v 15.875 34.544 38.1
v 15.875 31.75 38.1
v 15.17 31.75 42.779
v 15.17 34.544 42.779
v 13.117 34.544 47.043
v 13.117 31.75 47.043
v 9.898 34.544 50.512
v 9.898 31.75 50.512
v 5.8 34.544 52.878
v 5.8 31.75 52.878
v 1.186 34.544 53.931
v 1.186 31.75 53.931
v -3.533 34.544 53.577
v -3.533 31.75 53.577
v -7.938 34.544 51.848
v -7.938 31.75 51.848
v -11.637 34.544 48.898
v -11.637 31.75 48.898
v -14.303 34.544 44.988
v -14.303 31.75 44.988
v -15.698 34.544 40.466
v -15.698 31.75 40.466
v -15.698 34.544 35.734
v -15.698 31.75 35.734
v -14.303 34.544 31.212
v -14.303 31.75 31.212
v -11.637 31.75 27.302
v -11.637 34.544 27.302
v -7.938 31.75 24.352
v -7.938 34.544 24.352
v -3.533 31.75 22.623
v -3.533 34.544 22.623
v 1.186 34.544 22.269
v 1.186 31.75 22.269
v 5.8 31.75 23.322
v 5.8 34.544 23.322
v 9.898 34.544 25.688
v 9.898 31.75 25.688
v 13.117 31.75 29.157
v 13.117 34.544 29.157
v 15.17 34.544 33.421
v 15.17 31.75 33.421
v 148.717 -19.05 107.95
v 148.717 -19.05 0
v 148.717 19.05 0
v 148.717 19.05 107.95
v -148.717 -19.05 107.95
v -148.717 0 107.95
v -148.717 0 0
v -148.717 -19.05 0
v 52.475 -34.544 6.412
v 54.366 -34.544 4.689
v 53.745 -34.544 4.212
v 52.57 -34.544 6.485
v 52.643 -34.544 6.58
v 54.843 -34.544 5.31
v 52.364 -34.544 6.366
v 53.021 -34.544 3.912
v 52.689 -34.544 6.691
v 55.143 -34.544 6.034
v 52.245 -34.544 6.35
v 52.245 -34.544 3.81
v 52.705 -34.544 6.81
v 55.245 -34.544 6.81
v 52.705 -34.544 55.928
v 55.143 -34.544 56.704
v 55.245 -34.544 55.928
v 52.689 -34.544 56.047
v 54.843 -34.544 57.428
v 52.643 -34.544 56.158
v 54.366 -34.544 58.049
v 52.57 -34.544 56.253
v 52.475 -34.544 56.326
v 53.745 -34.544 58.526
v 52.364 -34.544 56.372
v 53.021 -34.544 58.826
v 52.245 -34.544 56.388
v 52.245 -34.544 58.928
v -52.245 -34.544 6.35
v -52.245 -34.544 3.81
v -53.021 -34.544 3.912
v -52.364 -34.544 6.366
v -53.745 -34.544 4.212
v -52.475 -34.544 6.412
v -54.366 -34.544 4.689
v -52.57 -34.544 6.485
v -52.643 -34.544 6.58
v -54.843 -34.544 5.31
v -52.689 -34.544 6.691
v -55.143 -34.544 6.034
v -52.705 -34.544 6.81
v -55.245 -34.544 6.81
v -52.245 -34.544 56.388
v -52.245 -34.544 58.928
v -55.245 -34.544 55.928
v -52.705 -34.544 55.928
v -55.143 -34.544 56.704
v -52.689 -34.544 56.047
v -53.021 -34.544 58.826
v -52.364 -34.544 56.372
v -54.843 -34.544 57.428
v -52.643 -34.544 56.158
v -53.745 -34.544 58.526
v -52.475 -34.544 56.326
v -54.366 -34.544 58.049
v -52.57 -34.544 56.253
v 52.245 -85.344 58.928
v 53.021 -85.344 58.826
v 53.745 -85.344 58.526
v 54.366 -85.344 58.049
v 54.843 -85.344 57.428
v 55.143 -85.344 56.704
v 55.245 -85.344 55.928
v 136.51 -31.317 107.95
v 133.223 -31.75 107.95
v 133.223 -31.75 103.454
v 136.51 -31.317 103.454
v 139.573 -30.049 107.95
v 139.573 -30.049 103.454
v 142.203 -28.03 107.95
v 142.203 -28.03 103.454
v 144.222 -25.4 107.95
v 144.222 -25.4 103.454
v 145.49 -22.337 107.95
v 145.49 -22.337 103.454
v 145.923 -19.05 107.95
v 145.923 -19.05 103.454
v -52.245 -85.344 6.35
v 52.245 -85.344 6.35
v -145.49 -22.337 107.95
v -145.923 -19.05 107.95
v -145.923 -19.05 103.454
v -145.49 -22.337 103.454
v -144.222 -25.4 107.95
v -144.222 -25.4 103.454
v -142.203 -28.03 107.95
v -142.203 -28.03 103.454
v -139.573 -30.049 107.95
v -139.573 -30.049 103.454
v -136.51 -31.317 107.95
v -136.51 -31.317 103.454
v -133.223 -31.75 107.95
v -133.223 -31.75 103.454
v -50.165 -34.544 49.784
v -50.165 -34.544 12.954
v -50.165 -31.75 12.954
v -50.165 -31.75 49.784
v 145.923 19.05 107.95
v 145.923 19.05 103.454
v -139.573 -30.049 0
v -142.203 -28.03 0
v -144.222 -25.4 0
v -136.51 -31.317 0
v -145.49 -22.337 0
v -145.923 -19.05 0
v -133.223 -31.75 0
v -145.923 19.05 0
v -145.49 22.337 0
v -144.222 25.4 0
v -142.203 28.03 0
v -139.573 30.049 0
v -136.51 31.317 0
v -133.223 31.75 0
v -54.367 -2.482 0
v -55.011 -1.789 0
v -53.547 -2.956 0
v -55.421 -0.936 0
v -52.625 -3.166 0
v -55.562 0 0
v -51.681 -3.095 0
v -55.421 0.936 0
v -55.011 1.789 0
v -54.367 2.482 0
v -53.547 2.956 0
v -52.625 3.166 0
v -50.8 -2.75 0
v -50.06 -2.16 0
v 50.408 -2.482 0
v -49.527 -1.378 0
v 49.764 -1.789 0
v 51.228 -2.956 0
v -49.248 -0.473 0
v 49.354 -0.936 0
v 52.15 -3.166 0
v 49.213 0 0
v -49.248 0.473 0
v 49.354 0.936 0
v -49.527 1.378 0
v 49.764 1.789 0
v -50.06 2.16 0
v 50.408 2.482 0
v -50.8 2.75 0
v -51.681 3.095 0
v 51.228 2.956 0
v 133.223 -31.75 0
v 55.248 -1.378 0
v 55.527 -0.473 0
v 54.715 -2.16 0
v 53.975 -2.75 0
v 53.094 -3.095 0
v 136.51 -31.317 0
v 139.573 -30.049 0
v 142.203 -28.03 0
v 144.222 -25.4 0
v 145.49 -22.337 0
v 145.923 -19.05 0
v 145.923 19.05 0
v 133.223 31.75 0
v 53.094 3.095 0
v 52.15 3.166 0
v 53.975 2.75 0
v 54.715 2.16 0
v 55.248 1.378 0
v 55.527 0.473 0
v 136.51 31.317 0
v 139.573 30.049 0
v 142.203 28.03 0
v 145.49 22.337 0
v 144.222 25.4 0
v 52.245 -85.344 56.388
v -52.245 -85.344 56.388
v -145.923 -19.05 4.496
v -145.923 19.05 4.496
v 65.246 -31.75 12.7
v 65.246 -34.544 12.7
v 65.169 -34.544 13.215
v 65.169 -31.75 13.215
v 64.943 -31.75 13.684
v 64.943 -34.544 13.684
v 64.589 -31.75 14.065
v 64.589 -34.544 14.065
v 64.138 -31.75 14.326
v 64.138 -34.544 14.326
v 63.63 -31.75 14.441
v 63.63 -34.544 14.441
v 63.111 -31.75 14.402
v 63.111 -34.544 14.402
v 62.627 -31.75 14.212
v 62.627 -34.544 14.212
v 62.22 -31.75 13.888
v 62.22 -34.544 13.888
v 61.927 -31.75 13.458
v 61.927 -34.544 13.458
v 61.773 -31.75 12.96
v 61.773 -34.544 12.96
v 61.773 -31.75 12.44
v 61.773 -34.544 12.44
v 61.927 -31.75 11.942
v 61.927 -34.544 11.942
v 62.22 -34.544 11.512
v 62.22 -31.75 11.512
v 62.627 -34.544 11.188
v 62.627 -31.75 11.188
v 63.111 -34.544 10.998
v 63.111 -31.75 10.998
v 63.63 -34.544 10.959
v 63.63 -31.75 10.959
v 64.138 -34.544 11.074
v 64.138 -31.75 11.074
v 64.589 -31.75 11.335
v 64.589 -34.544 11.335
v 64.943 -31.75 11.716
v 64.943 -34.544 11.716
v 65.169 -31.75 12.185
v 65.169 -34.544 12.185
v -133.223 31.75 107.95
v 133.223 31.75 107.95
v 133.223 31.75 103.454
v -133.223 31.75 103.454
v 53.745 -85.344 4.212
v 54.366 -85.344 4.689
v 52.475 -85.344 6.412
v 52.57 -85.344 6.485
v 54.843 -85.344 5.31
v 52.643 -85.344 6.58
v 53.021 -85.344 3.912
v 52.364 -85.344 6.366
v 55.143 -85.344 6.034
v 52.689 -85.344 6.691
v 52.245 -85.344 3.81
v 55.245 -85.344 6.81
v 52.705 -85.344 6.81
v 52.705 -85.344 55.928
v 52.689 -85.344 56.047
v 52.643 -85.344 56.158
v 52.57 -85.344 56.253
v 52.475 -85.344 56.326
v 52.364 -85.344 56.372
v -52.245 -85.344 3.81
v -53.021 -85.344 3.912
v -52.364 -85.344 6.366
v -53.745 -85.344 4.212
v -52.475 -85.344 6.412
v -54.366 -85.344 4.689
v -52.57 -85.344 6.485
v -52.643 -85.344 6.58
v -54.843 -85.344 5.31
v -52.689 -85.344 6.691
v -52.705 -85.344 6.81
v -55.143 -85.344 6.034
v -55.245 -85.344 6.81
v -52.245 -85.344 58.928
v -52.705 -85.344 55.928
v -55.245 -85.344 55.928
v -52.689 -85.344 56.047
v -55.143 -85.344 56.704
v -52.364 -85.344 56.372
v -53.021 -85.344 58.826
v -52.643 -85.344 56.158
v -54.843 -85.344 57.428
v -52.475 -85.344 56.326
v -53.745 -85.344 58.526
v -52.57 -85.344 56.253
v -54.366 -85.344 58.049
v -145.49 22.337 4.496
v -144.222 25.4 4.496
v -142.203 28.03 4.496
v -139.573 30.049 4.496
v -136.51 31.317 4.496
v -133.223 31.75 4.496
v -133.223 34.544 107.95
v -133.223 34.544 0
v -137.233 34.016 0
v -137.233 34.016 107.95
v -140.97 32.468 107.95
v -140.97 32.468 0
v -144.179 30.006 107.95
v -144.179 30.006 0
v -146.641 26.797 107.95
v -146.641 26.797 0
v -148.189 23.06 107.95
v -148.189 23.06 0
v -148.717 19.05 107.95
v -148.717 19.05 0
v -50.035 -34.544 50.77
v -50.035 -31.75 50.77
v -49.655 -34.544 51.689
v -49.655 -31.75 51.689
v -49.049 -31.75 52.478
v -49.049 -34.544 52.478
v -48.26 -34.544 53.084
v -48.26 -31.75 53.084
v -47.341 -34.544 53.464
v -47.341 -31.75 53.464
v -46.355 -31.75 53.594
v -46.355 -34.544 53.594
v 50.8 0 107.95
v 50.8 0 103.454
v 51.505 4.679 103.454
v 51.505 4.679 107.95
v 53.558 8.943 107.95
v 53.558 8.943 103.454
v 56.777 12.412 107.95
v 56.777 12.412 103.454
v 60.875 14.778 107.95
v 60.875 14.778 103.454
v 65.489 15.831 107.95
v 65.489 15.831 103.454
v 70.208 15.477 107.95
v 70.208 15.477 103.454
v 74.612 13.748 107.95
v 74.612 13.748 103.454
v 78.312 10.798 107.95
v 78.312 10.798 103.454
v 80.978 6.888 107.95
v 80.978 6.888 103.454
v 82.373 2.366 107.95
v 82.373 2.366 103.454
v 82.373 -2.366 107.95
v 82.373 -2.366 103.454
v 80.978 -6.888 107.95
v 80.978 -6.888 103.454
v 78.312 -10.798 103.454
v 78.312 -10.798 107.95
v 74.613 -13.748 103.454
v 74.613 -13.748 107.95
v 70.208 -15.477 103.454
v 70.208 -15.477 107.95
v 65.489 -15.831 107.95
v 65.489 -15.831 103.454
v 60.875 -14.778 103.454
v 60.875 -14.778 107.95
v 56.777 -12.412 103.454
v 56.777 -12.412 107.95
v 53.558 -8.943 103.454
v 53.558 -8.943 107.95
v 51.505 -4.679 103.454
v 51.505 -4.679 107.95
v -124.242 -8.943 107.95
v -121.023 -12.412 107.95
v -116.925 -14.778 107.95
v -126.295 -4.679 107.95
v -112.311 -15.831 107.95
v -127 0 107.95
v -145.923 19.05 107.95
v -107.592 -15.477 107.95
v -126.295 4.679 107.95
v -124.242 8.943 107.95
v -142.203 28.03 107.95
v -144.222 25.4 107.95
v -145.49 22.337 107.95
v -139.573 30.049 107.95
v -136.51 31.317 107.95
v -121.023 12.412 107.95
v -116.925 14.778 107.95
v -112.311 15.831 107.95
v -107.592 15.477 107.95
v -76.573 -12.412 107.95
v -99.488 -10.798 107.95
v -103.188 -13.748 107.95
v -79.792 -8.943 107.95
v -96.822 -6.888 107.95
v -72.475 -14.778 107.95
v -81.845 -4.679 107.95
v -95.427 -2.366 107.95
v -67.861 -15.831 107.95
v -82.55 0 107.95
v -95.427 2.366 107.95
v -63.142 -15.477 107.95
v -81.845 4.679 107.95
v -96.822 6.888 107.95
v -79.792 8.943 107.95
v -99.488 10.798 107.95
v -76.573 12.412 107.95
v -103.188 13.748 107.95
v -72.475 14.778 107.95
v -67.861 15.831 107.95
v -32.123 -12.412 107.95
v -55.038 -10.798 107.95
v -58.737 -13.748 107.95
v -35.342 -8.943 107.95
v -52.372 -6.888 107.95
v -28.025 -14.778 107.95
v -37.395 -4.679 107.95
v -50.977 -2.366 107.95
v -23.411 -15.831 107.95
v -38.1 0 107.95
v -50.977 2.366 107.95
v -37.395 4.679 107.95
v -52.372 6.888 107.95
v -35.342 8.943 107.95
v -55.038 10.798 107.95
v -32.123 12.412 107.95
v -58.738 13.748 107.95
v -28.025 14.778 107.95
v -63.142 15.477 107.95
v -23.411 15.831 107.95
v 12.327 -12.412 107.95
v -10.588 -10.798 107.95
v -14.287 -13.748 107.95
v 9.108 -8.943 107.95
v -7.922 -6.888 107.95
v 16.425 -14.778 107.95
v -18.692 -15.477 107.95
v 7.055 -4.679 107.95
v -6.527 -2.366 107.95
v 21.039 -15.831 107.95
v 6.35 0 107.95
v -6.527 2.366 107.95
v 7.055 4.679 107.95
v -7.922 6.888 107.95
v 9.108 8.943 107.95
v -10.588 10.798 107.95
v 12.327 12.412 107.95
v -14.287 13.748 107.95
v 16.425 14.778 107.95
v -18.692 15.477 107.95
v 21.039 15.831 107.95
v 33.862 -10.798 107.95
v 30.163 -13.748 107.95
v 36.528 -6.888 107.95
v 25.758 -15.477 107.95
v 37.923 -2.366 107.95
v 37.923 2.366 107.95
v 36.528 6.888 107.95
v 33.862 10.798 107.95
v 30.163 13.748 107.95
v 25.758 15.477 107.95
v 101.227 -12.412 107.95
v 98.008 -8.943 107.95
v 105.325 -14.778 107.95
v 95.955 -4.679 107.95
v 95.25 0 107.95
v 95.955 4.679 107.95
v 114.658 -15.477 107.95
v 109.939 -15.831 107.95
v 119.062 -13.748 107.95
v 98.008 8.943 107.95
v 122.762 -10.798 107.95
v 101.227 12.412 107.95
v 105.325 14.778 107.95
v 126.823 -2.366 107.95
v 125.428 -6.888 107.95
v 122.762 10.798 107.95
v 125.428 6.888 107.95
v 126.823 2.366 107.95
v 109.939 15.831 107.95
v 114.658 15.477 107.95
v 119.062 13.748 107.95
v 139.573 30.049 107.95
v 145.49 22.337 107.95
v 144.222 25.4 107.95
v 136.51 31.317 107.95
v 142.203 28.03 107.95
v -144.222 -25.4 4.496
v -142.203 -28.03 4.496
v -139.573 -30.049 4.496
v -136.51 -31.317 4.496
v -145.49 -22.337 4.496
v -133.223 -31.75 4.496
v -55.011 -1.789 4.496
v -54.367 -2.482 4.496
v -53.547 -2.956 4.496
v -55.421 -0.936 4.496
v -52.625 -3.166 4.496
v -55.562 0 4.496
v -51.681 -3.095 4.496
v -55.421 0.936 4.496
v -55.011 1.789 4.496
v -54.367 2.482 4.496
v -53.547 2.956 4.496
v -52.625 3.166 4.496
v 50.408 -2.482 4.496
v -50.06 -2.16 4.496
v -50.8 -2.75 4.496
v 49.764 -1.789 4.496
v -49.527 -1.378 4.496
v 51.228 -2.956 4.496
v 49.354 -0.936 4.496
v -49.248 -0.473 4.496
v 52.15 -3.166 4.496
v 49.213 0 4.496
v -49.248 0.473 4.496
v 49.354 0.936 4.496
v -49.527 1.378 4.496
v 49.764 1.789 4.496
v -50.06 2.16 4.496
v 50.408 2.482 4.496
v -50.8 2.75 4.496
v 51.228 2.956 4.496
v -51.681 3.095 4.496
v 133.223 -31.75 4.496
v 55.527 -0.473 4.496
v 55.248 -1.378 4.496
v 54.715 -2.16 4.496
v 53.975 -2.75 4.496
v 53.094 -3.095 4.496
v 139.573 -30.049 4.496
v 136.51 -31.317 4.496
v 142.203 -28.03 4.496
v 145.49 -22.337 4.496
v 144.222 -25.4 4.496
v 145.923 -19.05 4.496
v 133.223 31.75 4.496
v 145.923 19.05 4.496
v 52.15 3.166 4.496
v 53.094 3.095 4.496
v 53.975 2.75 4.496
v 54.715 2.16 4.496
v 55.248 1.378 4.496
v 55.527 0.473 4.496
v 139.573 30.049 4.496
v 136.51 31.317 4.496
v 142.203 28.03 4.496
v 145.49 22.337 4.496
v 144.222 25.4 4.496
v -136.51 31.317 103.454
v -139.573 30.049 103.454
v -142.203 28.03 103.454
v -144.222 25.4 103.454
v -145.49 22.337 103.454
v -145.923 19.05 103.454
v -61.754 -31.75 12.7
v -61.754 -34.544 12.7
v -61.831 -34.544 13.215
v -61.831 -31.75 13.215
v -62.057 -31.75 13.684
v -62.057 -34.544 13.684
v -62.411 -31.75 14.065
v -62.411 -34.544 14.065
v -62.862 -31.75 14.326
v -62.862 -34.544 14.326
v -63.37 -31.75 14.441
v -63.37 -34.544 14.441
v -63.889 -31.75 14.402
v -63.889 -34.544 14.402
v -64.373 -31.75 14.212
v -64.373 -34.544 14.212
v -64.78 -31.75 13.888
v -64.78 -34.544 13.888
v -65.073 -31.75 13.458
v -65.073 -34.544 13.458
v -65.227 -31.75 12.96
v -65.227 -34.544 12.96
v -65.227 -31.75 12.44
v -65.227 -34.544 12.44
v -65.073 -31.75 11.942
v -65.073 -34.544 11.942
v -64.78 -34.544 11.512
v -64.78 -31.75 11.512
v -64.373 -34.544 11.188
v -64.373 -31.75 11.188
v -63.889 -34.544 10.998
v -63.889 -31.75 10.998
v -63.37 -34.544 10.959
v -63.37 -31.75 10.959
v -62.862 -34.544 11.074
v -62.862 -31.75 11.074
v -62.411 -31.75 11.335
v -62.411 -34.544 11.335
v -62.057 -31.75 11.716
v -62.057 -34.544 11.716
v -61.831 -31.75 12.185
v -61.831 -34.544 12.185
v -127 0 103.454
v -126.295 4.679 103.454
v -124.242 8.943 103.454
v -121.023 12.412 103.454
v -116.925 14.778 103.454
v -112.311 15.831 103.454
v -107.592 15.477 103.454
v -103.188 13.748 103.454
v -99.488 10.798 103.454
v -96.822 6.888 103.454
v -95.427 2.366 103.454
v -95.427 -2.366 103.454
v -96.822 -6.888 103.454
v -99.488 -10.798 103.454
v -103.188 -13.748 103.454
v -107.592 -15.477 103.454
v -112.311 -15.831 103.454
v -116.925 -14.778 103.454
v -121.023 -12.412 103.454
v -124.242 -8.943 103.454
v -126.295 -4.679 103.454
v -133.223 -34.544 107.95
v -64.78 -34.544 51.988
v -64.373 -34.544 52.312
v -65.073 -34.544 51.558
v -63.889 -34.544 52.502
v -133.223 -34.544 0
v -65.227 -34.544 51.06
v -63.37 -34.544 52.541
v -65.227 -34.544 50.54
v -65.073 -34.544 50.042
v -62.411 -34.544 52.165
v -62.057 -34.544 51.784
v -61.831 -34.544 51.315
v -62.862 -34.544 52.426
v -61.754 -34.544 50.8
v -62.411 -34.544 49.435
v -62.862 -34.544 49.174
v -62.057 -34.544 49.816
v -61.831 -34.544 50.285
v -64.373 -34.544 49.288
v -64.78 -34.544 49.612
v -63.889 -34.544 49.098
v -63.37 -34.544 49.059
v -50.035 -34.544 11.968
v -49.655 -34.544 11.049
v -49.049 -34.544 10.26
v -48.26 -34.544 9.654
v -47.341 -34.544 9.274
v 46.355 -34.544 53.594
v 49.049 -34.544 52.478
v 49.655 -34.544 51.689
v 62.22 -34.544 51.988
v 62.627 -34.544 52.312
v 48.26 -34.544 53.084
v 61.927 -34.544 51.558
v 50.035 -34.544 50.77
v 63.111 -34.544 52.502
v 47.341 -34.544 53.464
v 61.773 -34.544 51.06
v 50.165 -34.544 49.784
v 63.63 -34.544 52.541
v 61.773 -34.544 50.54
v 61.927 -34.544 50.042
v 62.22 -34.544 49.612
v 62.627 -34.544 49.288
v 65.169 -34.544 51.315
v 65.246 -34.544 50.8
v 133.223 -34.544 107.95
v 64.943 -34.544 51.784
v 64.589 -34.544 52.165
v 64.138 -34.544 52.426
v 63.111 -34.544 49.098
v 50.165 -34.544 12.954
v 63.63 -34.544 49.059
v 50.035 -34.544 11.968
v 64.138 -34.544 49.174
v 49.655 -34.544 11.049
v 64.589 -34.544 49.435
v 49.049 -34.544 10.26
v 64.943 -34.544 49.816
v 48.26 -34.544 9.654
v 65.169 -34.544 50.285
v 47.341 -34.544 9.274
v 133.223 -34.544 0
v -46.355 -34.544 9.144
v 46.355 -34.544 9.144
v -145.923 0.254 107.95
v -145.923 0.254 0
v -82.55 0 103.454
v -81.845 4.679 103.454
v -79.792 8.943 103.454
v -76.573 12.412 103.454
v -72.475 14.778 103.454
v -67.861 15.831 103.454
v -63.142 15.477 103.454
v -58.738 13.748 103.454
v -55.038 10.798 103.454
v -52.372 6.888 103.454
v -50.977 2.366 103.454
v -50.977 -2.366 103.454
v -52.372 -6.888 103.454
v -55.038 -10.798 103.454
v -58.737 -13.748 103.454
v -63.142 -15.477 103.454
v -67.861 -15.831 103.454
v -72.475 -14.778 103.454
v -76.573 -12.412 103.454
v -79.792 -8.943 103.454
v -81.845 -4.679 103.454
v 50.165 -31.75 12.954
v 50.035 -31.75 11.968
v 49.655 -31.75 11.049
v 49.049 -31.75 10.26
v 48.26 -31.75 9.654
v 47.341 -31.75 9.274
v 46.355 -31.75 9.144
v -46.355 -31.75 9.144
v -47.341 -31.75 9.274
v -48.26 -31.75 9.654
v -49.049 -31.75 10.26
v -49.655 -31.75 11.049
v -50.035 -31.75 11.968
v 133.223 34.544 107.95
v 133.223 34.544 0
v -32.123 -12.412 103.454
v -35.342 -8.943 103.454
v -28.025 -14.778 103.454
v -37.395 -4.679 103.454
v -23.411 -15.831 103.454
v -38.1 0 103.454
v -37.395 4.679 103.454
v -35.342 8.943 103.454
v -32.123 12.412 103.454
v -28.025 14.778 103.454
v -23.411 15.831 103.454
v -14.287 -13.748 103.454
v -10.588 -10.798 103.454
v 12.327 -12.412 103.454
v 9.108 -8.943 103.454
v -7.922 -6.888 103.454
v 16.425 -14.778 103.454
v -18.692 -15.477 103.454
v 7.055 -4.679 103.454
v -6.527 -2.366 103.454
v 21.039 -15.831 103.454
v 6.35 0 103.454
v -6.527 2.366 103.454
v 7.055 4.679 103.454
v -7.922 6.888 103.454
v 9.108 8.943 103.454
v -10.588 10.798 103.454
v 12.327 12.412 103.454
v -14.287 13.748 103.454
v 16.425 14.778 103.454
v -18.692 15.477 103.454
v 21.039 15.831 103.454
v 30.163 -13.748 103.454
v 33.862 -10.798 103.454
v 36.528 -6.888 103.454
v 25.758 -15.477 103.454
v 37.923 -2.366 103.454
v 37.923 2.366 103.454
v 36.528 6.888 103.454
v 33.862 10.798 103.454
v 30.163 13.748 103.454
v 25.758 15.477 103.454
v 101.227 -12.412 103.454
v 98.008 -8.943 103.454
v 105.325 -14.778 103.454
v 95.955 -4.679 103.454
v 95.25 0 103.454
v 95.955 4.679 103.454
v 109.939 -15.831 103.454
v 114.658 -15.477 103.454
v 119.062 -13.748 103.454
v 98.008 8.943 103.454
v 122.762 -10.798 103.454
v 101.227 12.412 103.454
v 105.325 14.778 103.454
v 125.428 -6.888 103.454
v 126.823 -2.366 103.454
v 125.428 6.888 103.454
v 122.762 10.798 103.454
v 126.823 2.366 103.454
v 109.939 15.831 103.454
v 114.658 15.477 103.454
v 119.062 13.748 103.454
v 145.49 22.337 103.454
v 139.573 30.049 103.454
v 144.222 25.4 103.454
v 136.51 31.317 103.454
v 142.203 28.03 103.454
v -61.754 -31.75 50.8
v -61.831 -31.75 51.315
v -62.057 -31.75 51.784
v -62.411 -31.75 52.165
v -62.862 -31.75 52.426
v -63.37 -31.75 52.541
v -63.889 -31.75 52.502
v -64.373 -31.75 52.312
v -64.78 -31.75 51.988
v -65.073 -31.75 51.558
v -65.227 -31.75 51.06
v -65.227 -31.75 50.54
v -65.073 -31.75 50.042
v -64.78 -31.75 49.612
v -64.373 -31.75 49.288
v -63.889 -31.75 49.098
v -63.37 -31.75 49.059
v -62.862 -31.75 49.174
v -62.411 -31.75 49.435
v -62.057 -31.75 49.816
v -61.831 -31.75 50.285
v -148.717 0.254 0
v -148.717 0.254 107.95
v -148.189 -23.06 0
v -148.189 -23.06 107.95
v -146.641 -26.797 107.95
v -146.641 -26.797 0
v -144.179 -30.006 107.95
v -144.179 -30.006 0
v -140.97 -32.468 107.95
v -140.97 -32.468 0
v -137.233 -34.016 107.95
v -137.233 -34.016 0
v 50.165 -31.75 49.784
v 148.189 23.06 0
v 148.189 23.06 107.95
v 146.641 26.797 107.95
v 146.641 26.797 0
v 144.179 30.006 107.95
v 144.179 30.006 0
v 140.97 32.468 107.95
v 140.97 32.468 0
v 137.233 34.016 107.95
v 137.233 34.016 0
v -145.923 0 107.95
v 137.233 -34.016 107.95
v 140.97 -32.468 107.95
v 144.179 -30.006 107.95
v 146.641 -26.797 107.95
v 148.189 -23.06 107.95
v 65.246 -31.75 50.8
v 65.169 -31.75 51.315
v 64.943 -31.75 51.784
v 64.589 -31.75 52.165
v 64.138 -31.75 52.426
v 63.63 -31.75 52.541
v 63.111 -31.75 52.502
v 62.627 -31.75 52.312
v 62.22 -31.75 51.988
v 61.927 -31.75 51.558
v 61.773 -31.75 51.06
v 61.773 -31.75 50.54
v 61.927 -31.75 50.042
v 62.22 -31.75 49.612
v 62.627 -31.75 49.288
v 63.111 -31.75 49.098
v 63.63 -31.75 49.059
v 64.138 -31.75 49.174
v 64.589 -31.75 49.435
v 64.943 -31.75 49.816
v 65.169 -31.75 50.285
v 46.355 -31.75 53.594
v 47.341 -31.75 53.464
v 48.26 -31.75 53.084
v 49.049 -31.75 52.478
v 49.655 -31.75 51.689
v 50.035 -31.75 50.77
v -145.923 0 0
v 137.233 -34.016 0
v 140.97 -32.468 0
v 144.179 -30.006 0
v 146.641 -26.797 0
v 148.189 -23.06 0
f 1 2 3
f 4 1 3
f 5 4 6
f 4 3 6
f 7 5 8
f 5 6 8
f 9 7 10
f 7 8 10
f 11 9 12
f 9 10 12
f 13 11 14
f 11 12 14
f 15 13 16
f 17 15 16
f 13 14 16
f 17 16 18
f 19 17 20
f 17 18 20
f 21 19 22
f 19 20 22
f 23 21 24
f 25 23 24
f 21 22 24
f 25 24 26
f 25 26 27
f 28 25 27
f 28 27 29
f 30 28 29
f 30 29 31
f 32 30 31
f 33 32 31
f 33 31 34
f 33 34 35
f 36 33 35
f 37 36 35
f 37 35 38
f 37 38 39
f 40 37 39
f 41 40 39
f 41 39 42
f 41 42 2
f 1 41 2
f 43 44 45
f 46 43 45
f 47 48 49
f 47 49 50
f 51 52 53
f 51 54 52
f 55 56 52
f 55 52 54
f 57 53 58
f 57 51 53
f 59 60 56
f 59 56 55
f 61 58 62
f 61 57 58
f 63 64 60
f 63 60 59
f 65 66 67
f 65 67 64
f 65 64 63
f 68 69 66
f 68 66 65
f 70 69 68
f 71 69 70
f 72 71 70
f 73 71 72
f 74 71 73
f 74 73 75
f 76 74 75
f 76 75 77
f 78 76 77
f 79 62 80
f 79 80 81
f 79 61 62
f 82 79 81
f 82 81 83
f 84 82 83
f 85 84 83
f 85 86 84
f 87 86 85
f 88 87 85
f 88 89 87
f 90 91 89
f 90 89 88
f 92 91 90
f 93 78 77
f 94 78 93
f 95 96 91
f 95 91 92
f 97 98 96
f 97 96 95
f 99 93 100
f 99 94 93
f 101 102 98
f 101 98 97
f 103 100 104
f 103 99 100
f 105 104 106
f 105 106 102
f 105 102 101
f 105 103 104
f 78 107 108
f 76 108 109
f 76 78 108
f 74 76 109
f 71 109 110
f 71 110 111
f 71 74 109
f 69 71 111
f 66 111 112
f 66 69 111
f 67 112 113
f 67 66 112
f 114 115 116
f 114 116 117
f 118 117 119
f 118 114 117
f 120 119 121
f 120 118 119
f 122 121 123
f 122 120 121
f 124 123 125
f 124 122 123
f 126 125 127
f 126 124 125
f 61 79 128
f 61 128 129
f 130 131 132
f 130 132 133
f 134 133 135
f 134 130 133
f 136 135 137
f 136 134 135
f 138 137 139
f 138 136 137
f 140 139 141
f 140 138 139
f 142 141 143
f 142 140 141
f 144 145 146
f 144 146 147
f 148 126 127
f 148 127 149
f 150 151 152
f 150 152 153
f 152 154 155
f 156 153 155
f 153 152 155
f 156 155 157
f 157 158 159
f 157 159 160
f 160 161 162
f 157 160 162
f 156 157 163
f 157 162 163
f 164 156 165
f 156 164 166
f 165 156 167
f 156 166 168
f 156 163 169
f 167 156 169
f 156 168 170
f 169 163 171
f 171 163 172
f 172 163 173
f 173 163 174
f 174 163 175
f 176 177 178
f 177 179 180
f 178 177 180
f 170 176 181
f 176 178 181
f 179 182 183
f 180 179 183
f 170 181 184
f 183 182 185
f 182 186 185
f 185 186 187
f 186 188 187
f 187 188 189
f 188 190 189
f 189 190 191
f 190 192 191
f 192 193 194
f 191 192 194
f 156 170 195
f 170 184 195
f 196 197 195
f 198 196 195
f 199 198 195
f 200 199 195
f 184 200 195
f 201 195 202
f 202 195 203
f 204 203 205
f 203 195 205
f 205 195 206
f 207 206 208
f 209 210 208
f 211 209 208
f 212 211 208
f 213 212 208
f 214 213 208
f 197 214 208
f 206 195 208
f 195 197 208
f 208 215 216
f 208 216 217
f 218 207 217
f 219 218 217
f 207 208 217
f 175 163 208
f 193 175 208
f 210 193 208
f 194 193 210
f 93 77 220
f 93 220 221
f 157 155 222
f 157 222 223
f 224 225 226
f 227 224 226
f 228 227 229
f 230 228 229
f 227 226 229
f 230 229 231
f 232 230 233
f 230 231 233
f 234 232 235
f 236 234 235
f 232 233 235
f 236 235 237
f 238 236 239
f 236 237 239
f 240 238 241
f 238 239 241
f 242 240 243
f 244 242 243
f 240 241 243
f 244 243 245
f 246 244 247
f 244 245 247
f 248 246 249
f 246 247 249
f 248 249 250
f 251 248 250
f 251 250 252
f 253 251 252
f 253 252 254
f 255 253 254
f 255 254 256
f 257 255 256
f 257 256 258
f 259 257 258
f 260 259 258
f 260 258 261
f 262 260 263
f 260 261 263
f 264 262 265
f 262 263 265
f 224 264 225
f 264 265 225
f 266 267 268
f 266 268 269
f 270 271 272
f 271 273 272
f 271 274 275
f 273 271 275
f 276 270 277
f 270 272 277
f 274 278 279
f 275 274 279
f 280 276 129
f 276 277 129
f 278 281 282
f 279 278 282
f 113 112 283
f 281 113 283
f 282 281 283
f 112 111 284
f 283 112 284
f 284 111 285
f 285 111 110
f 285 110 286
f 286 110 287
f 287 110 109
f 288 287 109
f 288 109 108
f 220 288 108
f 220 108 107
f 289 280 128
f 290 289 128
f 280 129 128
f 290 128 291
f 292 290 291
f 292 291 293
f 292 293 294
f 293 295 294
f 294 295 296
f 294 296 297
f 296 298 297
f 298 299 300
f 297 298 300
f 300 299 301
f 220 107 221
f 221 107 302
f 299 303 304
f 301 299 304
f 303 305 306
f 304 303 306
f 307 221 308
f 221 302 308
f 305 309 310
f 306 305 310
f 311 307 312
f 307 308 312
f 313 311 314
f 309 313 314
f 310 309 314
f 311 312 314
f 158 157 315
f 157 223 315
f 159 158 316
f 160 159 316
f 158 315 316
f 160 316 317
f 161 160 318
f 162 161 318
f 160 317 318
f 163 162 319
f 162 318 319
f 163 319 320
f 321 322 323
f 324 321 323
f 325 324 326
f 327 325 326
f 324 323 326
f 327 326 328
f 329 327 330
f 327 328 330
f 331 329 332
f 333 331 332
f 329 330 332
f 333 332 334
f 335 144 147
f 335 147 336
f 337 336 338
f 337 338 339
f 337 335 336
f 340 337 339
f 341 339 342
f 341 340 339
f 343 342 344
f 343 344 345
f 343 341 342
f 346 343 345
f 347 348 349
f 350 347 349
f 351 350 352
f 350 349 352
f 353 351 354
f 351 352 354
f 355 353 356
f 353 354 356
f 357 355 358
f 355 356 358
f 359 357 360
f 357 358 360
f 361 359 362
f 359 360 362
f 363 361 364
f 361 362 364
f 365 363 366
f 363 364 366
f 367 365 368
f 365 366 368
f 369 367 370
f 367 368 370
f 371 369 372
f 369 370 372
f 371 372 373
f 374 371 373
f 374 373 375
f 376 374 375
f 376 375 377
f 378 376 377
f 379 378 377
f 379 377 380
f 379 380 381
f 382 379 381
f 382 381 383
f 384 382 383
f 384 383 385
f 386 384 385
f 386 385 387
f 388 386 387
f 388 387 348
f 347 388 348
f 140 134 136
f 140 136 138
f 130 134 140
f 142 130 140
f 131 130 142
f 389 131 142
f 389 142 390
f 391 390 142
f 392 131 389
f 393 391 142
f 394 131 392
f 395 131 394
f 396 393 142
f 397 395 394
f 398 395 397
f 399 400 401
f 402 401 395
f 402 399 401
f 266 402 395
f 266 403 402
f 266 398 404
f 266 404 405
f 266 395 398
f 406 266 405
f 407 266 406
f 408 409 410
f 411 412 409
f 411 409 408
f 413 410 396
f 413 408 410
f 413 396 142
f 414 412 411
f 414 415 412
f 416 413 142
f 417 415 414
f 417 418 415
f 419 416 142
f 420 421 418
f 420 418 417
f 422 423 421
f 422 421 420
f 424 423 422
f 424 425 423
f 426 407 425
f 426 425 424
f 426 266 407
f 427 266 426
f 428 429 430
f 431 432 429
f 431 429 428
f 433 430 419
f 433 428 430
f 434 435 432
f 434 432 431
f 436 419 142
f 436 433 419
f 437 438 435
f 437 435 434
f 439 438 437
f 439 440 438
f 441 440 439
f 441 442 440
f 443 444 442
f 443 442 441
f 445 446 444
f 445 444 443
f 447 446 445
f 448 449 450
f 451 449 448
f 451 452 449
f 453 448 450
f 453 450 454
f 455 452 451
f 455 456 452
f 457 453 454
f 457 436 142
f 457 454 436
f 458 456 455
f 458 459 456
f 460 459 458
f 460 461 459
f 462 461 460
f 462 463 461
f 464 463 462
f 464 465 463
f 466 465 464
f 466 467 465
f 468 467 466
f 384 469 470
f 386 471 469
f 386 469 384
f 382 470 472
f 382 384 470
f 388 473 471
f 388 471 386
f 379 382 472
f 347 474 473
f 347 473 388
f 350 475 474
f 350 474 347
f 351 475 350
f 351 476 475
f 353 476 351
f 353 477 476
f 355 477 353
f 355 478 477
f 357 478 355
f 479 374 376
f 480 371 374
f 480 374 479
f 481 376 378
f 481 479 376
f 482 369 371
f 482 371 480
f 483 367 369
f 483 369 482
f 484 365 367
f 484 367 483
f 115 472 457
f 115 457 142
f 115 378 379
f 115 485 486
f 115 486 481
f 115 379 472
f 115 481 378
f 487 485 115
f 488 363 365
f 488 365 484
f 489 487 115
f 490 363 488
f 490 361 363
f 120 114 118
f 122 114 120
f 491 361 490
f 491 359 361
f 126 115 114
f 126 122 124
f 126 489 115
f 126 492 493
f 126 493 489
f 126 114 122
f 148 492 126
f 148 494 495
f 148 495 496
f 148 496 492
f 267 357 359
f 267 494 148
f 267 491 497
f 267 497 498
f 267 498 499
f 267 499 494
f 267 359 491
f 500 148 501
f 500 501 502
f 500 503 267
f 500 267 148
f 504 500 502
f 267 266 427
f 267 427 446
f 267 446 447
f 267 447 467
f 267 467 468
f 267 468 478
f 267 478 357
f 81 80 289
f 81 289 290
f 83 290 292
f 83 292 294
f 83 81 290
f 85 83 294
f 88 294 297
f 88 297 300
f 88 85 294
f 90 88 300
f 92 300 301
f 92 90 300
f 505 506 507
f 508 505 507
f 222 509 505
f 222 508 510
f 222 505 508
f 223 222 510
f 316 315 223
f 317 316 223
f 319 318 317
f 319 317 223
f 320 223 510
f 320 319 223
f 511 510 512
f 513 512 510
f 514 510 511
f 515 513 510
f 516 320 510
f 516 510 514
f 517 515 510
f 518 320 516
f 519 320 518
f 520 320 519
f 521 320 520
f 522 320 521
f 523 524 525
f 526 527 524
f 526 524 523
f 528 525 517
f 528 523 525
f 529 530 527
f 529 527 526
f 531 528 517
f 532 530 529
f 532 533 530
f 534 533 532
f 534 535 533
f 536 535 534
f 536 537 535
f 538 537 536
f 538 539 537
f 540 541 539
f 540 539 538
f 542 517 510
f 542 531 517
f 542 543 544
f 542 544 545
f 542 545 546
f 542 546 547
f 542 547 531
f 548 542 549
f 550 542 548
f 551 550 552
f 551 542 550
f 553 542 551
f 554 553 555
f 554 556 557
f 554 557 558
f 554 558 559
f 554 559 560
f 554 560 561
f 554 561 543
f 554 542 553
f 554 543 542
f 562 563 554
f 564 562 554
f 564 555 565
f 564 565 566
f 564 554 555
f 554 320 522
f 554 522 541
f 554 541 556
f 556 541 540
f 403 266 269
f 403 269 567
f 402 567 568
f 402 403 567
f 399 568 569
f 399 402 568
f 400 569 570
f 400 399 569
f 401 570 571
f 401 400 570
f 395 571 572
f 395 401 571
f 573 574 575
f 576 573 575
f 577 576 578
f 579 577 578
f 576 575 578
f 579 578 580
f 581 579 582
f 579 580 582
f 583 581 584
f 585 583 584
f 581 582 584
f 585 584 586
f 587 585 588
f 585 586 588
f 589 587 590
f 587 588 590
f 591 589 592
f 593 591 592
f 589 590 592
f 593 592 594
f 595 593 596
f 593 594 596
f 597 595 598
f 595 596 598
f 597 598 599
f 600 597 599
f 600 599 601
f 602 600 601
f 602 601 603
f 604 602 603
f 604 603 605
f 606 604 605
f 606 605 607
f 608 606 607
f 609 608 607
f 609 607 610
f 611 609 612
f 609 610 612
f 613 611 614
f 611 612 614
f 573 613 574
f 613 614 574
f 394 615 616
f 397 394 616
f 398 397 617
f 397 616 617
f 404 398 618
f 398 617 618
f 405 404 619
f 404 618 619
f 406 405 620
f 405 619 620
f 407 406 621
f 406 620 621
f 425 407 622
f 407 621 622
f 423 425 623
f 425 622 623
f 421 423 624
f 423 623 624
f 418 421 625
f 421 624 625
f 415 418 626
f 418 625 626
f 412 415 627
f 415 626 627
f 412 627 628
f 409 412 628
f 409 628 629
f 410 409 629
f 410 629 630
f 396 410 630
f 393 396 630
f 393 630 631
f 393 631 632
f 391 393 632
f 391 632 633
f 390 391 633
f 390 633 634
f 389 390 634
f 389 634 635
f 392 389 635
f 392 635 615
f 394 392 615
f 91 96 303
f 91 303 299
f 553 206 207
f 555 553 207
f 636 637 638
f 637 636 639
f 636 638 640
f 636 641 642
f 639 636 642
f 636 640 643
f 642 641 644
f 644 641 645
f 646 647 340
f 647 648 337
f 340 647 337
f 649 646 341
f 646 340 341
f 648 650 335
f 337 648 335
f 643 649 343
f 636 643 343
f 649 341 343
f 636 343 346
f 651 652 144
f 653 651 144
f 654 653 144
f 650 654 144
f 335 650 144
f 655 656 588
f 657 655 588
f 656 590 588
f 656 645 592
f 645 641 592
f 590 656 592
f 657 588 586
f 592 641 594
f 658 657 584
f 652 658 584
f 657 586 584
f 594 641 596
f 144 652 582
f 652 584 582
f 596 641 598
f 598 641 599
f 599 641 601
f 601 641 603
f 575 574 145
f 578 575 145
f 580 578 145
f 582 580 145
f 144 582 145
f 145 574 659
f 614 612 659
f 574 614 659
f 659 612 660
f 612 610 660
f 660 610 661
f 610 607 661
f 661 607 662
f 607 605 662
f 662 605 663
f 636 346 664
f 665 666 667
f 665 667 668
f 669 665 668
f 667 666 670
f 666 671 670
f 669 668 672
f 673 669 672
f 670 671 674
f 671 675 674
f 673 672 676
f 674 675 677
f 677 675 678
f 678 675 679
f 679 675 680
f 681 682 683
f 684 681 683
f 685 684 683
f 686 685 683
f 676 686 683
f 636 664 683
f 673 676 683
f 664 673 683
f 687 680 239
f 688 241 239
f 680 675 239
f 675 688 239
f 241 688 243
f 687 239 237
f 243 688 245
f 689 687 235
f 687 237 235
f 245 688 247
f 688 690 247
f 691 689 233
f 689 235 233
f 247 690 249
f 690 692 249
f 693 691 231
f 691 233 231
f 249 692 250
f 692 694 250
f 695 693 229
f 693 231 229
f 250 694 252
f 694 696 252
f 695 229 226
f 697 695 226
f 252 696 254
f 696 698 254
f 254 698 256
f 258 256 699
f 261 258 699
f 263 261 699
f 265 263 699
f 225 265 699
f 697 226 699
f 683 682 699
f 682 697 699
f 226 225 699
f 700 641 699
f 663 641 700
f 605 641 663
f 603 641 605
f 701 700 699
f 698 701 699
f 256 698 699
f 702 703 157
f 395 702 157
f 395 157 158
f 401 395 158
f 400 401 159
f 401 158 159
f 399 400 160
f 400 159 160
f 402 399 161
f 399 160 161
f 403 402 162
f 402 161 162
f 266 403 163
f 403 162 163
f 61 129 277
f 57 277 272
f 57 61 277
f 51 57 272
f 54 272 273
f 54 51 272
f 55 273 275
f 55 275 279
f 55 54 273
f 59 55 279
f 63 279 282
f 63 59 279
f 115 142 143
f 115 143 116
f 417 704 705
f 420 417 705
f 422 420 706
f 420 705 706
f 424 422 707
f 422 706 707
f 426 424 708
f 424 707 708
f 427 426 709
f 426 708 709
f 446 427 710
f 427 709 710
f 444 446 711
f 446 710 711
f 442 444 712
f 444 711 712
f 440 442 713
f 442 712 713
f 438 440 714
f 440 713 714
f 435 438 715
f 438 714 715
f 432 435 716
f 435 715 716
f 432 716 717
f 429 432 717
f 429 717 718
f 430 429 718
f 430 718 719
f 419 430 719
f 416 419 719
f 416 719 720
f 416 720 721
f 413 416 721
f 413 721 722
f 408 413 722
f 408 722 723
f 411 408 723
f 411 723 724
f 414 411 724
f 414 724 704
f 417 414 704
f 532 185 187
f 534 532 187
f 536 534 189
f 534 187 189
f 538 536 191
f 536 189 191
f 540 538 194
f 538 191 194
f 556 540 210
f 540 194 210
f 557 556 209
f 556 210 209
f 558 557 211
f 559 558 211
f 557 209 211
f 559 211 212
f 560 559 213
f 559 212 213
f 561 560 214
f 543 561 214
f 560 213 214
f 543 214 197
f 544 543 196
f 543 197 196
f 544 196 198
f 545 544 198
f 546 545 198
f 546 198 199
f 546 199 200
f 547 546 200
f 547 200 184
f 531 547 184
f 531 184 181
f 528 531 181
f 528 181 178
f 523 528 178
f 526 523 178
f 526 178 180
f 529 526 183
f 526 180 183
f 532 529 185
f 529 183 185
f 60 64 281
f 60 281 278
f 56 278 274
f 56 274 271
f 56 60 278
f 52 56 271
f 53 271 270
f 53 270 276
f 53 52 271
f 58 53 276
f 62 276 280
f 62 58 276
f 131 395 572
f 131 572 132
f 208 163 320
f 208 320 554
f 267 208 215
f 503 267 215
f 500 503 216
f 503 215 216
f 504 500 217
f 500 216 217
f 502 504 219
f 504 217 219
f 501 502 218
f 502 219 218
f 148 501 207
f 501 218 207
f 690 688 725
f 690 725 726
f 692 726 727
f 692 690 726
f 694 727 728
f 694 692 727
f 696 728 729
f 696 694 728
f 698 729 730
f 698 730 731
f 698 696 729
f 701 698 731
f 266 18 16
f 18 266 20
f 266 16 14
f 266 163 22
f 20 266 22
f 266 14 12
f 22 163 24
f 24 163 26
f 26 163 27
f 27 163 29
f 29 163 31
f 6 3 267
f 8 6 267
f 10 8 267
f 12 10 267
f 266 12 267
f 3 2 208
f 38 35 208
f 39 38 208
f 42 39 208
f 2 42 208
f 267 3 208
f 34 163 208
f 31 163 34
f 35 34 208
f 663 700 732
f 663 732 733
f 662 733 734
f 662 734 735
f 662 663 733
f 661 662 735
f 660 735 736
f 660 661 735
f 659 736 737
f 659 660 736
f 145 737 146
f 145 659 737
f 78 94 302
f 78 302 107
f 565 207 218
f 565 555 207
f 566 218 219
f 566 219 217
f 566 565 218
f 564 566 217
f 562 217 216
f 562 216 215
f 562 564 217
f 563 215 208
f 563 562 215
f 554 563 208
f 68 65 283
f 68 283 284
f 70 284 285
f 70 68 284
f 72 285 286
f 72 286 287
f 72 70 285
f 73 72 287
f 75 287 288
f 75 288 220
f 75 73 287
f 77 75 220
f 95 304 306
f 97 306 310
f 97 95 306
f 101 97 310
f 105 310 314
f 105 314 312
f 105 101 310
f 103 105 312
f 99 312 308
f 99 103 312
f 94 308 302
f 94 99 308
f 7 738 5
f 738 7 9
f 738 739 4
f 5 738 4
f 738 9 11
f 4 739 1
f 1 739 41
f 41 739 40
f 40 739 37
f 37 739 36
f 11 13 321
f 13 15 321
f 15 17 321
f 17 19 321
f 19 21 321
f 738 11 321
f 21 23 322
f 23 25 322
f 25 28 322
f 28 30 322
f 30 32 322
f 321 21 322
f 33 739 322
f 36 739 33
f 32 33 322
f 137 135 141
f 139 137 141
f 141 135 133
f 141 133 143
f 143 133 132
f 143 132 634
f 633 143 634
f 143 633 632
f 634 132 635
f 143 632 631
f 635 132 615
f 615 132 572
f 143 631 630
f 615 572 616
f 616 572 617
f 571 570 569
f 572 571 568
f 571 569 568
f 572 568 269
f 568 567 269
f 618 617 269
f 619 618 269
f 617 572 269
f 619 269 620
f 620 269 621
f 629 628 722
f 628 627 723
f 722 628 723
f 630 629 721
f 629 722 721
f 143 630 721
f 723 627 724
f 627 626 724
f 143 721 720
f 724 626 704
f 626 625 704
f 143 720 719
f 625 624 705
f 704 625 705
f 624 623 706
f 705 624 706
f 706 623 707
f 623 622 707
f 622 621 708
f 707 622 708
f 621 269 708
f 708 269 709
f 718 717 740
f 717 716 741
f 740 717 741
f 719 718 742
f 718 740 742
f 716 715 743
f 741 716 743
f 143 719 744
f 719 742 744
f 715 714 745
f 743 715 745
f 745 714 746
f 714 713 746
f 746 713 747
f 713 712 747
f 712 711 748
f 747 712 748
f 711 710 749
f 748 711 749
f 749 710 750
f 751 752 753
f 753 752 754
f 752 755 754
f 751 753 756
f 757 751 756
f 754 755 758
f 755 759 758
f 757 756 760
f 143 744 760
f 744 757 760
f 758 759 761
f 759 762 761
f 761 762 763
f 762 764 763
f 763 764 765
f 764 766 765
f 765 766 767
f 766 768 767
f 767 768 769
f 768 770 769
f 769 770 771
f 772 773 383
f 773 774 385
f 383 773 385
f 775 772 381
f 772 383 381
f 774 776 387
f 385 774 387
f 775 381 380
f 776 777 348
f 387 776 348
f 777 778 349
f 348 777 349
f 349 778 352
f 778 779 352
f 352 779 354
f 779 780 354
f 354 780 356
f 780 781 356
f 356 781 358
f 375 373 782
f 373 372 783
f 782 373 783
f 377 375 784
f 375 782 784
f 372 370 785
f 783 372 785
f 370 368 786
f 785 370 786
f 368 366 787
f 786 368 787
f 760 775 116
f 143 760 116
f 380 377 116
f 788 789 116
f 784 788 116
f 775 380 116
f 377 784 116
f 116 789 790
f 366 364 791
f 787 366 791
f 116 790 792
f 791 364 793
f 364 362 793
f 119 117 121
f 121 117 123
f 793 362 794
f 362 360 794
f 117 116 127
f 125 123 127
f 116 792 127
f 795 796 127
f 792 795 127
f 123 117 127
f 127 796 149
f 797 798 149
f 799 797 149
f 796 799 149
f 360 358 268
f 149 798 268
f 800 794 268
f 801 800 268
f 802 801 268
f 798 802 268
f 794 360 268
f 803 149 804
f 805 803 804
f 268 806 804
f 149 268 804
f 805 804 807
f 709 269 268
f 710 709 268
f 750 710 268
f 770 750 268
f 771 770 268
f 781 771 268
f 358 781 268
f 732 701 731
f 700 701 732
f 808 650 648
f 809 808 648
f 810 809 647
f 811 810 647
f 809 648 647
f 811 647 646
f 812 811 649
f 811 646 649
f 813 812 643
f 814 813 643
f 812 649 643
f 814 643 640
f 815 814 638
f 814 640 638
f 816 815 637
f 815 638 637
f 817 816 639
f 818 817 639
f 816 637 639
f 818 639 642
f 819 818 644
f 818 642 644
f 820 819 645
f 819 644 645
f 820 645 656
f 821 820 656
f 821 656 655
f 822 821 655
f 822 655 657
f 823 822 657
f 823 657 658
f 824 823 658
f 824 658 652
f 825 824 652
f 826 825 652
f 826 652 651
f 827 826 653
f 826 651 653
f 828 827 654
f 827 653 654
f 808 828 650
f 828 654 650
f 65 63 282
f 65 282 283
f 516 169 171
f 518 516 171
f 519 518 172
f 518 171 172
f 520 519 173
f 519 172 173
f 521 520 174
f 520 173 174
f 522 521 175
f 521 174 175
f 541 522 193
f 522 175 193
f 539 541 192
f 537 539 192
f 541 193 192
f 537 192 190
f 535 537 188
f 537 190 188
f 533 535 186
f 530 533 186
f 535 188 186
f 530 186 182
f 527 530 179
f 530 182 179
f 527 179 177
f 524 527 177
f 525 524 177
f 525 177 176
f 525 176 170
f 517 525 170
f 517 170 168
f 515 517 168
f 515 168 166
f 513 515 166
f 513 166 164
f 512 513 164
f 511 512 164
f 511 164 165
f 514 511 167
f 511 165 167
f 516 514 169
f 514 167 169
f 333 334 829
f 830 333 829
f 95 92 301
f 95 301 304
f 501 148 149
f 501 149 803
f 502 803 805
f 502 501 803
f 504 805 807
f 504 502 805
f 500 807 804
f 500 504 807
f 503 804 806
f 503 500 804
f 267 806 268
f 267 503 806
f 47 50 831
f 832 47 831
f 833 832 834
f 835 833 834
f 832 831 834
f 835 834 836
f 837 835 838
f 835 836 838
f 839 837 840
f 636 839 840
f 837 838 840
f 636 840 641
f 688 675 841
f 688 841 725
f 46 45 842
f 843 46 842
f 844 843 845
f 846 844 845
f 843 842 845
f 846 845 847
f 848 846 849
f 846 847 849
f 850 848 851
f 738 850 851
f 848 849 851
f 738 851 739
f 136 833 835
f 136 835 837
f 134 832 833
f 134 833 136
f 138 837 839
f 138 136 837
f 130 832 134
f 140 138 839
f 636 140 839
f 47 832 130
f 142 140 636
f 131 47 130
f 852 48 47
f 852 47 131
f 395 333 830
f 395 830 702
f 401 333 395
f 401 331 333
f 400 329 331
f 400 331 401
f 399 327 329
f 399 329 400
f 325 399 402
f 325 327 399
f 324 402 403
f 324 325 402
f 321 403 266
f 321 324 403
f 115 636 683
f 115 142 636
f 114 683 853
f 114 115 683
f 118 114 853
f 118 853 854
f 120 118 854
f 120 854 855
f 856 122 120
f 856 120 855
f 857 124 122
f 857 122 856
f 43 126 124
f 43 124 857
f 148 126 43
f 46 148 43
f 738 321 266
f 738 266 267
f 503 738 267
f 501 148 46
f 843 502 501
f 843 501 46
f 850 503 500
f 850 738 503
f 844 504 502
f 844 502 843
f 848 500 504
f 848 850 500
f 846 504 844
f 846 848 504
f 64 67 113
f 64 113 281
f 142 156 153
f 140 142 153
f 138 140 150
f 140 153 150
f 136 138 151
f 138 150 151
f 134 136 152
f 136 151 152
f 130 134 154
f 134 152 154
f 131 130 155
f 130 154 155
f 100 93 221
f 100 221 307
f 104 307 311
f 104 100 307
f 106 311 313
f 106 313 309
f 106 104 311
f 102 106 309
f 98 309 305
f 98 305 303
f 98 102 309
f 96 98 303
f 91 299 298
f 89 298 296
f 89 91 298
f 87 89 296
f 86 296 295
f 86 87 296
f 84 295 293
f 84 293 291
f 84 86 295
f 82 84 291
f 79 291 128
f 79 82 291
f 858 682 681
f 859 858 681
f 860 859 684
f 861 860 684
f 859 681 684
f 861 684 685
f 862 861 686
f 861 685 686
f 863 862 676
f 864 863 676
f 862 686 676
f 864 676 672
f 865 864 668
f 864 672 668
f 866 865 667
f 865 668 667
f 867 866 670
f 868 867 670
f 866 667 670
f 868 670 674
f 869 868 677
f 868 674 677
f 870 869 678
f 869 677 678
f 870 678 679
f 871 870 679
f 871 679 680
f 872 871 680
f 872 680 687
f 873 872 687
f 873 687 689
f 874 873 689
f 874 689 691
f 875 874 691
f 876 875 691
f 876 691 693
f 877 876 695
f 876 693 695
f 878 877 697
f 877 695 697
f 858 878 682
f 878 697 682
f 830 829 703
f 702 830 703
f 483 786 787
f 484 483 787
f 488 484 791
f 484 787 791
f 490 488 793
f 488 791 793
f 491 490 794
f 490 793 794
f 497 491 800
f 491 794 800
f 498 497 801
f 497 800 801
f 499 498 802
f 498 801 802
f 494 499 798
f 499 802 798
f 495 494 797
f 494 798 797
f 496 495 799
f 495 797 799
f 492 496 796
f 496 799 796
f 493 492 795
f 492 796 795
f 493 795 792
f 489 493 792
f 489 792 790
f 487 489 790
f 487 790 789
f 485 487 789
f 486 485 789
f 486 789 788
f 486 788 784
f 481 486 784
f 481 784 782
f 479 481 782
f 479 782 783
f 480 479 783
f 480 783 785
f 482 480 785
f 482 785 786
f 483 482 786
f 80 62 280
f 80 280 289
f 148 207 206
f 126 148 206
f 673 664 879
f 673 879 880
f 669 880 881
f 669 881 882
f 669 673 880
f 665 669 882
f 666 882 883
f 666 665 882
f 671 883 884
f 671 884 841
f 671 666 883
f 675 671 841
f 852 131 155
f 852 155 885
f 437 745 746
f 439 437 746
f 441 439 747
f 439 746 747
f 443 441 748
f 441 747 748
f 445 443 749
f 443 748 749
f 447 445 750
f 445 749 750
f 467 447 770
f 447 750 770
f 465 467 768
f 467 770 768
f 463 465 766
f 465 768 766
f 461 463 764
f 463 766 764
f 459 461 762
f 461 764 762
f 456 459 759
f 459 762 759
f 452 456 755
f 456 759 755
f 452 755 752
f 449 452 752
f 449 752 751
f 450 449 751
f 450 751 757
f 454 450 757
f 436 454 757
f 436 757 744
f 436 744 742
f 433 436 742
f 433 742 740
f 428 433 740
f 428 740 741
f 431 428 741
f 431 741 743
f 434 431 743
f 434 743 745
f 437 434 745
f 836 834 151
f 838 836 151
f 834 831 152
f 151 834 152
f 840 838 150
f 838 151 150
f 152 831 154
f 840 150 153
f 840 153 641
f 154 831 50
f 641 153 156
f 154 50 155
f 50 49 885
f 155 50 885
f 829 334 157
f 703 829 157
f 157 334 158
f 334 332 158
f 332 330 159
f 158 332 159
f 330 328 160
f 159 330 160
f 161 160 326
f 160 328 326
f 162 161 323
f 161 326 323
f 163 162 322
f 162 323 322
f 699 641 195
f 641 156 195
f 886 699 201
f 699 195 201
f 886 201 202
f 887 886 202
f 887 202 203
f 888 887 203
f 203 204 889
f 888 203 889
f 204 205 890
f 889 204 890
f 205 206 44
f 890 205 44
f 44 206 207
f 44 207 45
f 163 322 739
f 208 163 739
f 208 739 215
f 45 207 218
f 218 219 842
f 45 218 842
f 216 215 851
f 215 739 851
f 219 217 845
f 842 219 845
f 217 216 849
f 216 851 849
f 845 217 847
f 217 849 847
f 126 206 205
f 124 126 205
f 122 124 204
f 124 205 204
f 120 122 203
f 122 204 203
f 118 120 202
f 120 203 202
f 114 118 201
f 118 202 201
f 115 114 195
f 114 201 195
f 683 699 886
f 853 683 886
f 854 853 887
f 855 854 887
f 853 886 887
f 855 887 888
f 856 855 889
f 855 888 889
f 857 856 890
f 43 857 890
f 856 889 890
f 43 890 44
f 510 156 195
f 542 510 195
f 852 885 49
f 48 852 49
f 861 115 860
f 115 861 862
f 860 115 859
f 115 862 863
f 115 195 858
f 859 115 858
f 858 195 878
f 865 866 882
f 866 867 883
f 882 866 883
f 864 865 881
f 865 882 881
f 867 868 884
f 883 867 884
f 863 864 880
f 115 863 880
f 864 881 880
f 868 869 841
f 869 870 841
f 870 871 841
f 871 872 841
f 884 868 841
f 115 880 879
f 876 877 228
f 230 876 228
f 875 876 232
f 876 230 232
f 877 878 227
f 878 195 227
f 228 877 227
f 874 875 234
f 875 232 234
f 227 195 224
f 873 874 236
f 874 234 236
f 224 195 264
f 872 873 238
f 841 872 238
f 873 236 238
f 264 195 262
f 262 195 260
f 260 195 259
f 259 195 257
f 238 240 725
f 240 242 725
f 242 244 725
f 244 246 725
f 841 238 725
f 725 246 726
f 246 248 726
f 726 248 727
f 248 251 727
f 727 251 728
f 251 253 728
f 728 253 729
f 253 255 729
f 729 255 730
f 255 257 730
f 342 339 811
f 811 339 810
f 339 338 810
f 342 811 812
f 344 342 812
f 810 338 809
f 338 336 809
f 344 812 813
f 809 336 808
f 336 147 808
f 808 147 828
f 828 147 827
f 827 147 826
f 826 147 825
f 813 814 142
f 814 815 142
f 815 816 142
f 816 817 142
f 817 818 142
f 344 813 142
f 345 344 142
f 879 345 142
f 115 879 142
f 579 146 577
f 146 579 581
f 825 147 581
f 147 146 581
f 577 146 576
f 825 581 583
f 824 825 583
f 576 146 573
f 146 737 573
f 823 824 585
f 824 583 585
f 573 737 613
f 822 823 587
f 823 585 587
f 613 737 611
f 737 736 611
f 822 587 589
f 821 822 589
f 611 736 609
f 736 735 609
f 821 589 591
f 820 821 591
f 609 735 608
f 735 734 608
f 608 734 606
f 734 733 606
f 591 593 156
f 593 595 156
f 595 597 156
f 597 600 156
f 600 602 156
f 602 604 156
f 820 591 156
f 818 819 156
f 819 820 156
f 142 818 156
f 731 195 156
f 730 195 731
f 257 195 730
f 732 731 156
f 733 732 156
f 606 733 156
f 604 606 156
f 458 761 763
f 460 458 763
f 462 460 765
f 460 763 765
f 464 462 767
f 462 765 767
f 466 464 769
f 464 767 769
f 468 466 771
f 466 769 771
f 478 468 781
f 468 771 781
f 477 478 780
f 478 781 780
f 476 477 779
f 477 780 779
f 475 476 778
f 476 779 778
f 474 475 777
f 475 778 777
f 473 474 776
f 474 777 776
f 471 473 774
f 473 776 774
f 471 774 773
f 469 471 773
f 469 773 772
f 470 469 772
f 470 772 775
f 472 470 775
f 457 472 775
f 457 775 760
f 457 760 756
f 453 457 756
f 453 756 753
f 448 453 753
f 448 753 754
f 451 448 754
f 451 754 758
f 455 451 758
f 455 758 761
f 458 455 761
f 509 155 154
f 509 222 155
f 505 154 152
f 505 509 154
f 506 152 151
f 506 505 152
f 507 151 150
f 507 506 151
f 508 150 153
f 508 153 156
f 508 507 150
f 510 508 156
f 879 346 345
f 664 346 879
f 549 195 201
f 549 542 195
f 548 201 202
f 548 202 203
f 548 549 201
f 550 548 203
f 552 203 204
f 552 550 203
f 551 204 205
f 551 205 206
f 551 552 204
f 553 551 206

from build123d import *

# Parameters (mm, degrees)
SKETCH1_W           = 291.846
SKETCH1_H           = 63.5
BOSS_EXTRUDE1_DEPTH = 4.4958
FILLET1_R           = 12.7
BOSS_EXTRUDE2_DEPTH = 107.95
BOSS_EXTRUDE3_DEPTH = 4.4958
SKETCH2_R           = 15.875
CUT_EXTRUDE1_DEPTH  = 187.984589004
BOSS_EXTRUDE5_DEPTH = 50.8
SKETCH7_R           = 3.175
CUT_EXTRUDE2_DEPTH  = 4.4958
CUT_EXTRUDE3_DEPTH  = 2.794
CUT_EXTRUDE4_START  = -66.294
SKETCH9_R           = 15.875
CUT_EXTRUDE4_DEPTH  = 131.029967801
SKETCH10_R          = 1.74625
CUT_EXTRUDE5_DEPTH  = 2.794


with BuildPart() as part:
    # Sketch1 → Boss-Extrude1 (new body)
    with BuildSketch(Plane.XY):
        Rectangle(SKETCH1_W, SKETCH1_H)
    extrude(amount=BOSS_EXTRUDE1_DEPTH)

    # Fillet1
    fillet1_edges = [part.edges().sort_by_distance(p)[0] for p in [
        (145.923, -31.75, 2.2479),
        (-145.923, -31.75, 2.2479),
        (-145.923, 31.75, 2.2479),
        (145.923, 31.75, 2.2479),
    ]]
    fillet(fillet1_edges, radius=FILLET1_R)

    # Sketch7 → Cut-Extrude2 (cut)
    with BuildSketch(Plane(origin=(0, 0, 0), x_dir=(-1, 0, 0), z_dir=(0, 0, -1))):
        with Locations((-52.3875, 0)):
            Circle(SKETCH7_R)
        with Locations((52.3875, 0)):
            Circle(SKETCH7_R)
    extrude(amount=-CUT_EXTRUDE2_DEPTH, mode=Mode.SUBTRACT)


with BuildPart() as body_2:
    # Sketch3 → Boss-Extrude2 (new body)
    with BuildSketch(Plane.XY):
        with BuildLine():
            Line((133.223, 34.544), (-133.223, 34.544))
            ThreePointArc((-133.223, 34.544), (-144.178912468, 30.005912468), (-148.717, 19.05))
            Line((-148.717, 19.05), (-148.717, 0.254))
            Line((-148.717, 0.254), (-145.923, 0.254))
            Line((-145.923, 0.254), (-145.923, 19.05))
            ThreePointArc((-145.923, 19.05), (-142.203256121, 28.030256121), (-133.223, 31.75))
            Line((-133.223, 31.75), (133.223, 31.75))
            ThreePointArc((133.223, 31.75), (142.203256121, 28.030256121), (145.923, 19.05))
            Line((145.923, 19.05), (145.923, -19.05))
            ThreePointArc((145.923, -19.05), (142.203256121, -28.030256121), (133.223, -31.75))
            Line((133.223, -31.75), (-133.223, -31.75))
            ThreePointArc((-133.223, -31.75), (-142.203256121, -28.030256121), (-145.923, -19.05))
            Line((-145.923, -19.05), (-145.923, 0))
            Line((-145.923, 0), (-148.717, 0))
            Line((-148.717, 0), (-148.717, -19.05))
            ThreePointArc((-148.717, -19.05), (-144.178912468, -30.005912468), (-133.223, -34.544))
            Line((-133.223, -34.544), (133.223, -34.544))
            ThreePointArc((133.223, -34.544), (144.178912468, -30.005912468), (148.717, -19.05))
            Line((148.717, -19.05), (148.717, 19.05))
            ThreePointArc((148.717, 19.05), (144.178912468, 30.005912468), (133.223, 34.544))
        make_face()
    extrude(amount=BOSS_EXTRUDE2_DEPTH)

    # Sketch8 → Cut-Extrude3 (cut)
    with BuildSketch(Plane.XZ.offset(34.544)):
        with BuildLine():
            Line((-46.355, 53.594), (46.355, 53.594))
            ThreePointArc((46.355, 53.594), (49.049076836, 52.478076836), (50.165, 49.784))
            Line((50.165, 49.784), (50.165, 12.954))
            ThreePointArc((50.165, 12.954), (49.049076836, 10.259923164), (46.355, 9.144))
            Line((46.355, 9.144), (-46.355, 9.144))
            ThreePointArc((-46.355, 9.144), (-49.049076836, 10.259923164), (-50.165, 12.954))
            Line((-50.165, 12.954), (-50.165, 49.784))
            ThreePointArc((-50.165, 49.784), (-49.049076836, 52.478076836), (-46.355, 53.594))
        make_face()
    extrude(amount=-CUT_EXTRUDE3_DEPTH, mode=Mode.SUBTRACT)

    # Sketch9 → Cut-Extrude4 (cut, through all)
    with BuildSketch(Plane.XZ.offset(34.544).offset(CUT_EXTRUDE4_START)):
        with Locations((0, 38.1)):
            Circle(SKETCH9_R)
    extrude(amount=-CUT_EXTRUDE4_DEPTH, mode=Mode.SUBTRACT)

    # Sketch10 → Cut-Extrude5 (cut)
    with BuildSketch(Plane.XZ.offset(34.544)):
        with Locations((63.5, 50.8)):
            Circle(SKETCH10_R)
        with Locations((63.5, 12.7)):
            Circle(SKETCH10_R)
        with Locations((-63.5, 50.8)):
            Circle(SKETCH10_R)
        with Locations((-63.5, 12.7)):
            Circle(SKETCH10_R)
    extrude(amount=-CUT_EXTRUDE5_DEPTH, mode=Mode.SUBTRACT)


with BuildPart() as body_3:
    # Sketch4 → Boss-Extrude3 (new body)
    with BuildSketch(Plane.XY.offset(107.95)):
        with BuildLine():
            Line((-145.923, 19.05), (-145.923, -19.05))
            ThreePointArc((-145.923, -19.05), (-142.203256121, -28.030256121), (-133.223, -31.75))
            Line((-133.223, -31.75), (133.223, -31.75))
            ThreePointArc((133.223, -31.75), (142.203256121, -28.030256121), (145.923, -19.05))
            Line((145.923, -19.05), (145.923, 19.05))
            ThreePointArc((145.923, 19.05), (142.203256121, 28.030256121), (133.223, 31.75))
            Line((133.223, 31.75), (-133.223, 31.75))
            ThreePointArc((-133.223, 31.75), (-142.203256121, 28.030256121), (-145.923, 19.05))
        make_face()
    extrude(amount=-BOSS_EXTRUDE3_DEPTH)

    # Sketch2 → Cut-Extrude1 (cut, through all)
    with BuildSketch(Plane(origin=(0, 0, 0), x_dir=(-1, 0, 0), z_dir=(0, 0, -1))):
        with Locations((-111.125, 0)):
            Circle(SKETCH2_R)
        with Locations((-66.675, 0)):
            Circle(SKETCH2_R)
        with Locations((-22.225, 0)):
            Circle(SKETCH2_R)
        with Locations((22.225, 0)):
            Circle(SKETCH2_R)
        with Locations((66.675, 0)):
            Circle(SKETCH2_R)
        with Locations((111.125, 0)):
            Circle(SKETCH2_R)
    extrude(amount=-CUT_EXTRUDE1_DEPTH, mode=Mode.SUBTRACT)


with BuildPart() as body_4:
    # Sketch6 → Boss-Extrude5 (new body)
    with BuildSketch(Plane.XZ.offset(34.544)):
        with BuildLine():
            Line((-52.245, 58.928), (52.245, 58.928))
            ThreePointArc((52.245, 58.928), (54.366320344, 58.049320344), (55.245, 55.928))
            Line((55.245, 55.928), (55.245, 6.81))
            ThreePointArc((55.245, 6.81), (54.366320344, 4.688679656), (52.245, 3.81))
            Line((52.245, 3.81), (-52.245, 3.81))
            ThreePointArc((-52.245, 3.81), (-54.366320344, 4.688679656), (-55.245, 6.81))
            Line((-55.245, 6.81), (-55.245, 55.928))
            ThreePointArc((-55.245, 55.928), (-54.366320344, 58.049320344), (-52.245, 58.928))
        make_face()
        with BuildLine():
            Line((-52.705, 55.928), (-52.705, 6.81))
            ThreePointArc((-52.705, 6.81), (-52.570269119, 6.484730881), (-52.245, 6.35))
            Line((-52.245, 6.35), (52.245, 6.35))
            ThreePointArc((52.245, 6.35), (52.570269119, 6.484730881), (52.705, 6.81))
            Line((52.705, 6.81), (52.705, 55.928))
            ThreePointArc((52.705, 55.928), (52.570269119, 56.253269119), (52.245, 56.388))
            Line((52.245, 56.388), (-52.245, 56.388))
            ThreePointArc((-52.245, 56.388), (-52.570269119, 56.253269119), (-52.705, 55.928))
        make_face(mode=Mode.SUBTRACT)
    extrude(amount=BOSS_EXTRUDE5_DEPTH)


solid = Compound([part.part, body_2.part, body_3.part, body_4.part])
